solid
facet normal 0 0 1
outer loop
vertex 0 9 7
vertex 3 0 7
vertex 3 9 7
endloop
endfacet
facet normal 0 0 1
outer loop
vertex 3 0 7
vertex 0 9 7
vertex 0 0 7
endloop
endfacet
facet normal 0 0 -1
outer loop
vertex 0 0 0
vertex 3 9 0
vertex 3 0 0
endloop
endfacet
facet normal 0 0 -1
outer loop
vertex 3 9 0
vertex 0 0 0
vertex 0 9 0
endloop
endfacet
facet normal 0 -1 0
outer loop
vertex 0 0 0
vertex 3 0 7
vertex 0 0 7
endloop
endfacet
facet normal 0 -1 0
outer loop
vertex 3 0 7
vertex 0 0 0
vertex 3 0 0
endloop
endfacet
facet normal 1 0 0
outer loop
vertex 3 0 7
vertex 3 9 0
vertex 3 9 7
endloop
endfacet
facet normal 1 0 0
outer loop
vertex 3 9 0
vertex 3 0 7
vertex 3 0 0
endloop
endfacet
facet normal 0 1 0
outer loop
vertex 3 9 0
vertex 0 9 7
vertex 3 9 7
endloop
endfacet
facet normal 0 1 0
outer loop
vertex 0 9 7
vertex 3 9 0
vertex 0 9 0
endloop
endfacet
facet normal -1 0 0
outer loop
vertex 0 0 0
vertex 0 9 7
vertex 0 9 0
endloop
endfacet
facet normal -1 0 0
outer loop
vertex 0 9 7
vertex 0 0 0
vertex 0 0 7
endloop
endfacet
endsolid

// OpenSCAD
// Generated by SolidPython 1.0.1 on 2020-07-29 00:46:54


cube(size = [3, 9, 7]);
/***********************************************
*********      SolidPython code:      **********
************************************************
 
# import packages: SolidPython
from solid import *
from solid.utils import *
from itertools import chain, combinations, permutations


class Resize:

    def __init__(self, scad_file):
        self.scad_file = scad_file
        #self.scad_file = import_scad(scad_file)
        # cone/cylinder param:
        self.r1 = 0
        self.r2 = 0
        self.h = 0
        # rectangular prism param:
        self.w = 0
        self.l = 0
        # ellipse param:
        self.r = 0

    # import OpenScad code (file name corresponds to shape)


    # classify shape + parameters
    def assign(self, param1, param2, param3):
        if self.scad_file == 'cone.scad':
            self.r1 = param1
            self.r2 = param2
            self.h = param3
        elif self.scad_file == 'cylinder.scad':
            self.r1 = param1
            self.r2 = param2
            self.h = param3
        elif self.scad_file == 'rectangularPrism.scad':
            self.h = param1
            self.l = param2
            self.w = param3
        else:
            self.r = param1
            self.h = param2

    # resize parameters
    def iterate(self):
        x = range(3, 20, 2)
        i = 1
        if self.scad_file == 'cone.scad':
            tempList = list(permutations(x, 2))
            for temp in tempList:
                param1 = temp[0]
                param2 = temp[1]
                filepath = 'produced_scad_files/' + 'cone' + str(param1) + '_' + str(param2) + '_' + '.scad'
                scad_render_to_file(cylinder(h=param1, r1=param2, r2=0), filepath)

        elif self.scad_file == 'cylinder.scad':
            tempList = list(permutations(x, 3))
            for temp in tempList:
                param1 = temp[0]
                param2 = temp[1]
                filepath = 'produced_scad_files/' + 'cylinder' + str(param1) + '_' + str(param2) + '_' + '.scad'
                scad_render_to_file(cylinder(h=param1, r1=param2, r2=param2), filepath)

        elif self.scad_file == 'rectangularPrism.scad':
            tempList = list(permutations(x, 3))
            for temp in tempList:
                param1 = temp[0]
                param2 = temp[1]
                param3 = temp[2]
                filepath = 'produced_scad_files/' + 'rectangularPrism' + str(param1) + '_' + str(param2) + '_' + str(
                    param3) + '.scad'
                scad_render_to_file(cube(size=(param1, param2, param3)), filepath)

        elif self.scad_file == 'ellipse.scad':
            tempList = list(permutations(x, 4))
            for temp in tempList:
                param1 = temp[0]
                param2 = temp[1]
                param3 = temp[2]
                param4 = temp[3]
                filepath = 'produced_scad_files/' + 'ellipse' + str(param1) + '_' + str(param2) + '_' + str(param3) + '_' + str(param4) + '.scad'
                scad_render_to_file(scale([param1, param2, param3])(sphere(r=param4)), filepath)

    def render_to_scadfile(self):
        scad_render_to_file(scad, 'example.scad') 
 
************************************************/
